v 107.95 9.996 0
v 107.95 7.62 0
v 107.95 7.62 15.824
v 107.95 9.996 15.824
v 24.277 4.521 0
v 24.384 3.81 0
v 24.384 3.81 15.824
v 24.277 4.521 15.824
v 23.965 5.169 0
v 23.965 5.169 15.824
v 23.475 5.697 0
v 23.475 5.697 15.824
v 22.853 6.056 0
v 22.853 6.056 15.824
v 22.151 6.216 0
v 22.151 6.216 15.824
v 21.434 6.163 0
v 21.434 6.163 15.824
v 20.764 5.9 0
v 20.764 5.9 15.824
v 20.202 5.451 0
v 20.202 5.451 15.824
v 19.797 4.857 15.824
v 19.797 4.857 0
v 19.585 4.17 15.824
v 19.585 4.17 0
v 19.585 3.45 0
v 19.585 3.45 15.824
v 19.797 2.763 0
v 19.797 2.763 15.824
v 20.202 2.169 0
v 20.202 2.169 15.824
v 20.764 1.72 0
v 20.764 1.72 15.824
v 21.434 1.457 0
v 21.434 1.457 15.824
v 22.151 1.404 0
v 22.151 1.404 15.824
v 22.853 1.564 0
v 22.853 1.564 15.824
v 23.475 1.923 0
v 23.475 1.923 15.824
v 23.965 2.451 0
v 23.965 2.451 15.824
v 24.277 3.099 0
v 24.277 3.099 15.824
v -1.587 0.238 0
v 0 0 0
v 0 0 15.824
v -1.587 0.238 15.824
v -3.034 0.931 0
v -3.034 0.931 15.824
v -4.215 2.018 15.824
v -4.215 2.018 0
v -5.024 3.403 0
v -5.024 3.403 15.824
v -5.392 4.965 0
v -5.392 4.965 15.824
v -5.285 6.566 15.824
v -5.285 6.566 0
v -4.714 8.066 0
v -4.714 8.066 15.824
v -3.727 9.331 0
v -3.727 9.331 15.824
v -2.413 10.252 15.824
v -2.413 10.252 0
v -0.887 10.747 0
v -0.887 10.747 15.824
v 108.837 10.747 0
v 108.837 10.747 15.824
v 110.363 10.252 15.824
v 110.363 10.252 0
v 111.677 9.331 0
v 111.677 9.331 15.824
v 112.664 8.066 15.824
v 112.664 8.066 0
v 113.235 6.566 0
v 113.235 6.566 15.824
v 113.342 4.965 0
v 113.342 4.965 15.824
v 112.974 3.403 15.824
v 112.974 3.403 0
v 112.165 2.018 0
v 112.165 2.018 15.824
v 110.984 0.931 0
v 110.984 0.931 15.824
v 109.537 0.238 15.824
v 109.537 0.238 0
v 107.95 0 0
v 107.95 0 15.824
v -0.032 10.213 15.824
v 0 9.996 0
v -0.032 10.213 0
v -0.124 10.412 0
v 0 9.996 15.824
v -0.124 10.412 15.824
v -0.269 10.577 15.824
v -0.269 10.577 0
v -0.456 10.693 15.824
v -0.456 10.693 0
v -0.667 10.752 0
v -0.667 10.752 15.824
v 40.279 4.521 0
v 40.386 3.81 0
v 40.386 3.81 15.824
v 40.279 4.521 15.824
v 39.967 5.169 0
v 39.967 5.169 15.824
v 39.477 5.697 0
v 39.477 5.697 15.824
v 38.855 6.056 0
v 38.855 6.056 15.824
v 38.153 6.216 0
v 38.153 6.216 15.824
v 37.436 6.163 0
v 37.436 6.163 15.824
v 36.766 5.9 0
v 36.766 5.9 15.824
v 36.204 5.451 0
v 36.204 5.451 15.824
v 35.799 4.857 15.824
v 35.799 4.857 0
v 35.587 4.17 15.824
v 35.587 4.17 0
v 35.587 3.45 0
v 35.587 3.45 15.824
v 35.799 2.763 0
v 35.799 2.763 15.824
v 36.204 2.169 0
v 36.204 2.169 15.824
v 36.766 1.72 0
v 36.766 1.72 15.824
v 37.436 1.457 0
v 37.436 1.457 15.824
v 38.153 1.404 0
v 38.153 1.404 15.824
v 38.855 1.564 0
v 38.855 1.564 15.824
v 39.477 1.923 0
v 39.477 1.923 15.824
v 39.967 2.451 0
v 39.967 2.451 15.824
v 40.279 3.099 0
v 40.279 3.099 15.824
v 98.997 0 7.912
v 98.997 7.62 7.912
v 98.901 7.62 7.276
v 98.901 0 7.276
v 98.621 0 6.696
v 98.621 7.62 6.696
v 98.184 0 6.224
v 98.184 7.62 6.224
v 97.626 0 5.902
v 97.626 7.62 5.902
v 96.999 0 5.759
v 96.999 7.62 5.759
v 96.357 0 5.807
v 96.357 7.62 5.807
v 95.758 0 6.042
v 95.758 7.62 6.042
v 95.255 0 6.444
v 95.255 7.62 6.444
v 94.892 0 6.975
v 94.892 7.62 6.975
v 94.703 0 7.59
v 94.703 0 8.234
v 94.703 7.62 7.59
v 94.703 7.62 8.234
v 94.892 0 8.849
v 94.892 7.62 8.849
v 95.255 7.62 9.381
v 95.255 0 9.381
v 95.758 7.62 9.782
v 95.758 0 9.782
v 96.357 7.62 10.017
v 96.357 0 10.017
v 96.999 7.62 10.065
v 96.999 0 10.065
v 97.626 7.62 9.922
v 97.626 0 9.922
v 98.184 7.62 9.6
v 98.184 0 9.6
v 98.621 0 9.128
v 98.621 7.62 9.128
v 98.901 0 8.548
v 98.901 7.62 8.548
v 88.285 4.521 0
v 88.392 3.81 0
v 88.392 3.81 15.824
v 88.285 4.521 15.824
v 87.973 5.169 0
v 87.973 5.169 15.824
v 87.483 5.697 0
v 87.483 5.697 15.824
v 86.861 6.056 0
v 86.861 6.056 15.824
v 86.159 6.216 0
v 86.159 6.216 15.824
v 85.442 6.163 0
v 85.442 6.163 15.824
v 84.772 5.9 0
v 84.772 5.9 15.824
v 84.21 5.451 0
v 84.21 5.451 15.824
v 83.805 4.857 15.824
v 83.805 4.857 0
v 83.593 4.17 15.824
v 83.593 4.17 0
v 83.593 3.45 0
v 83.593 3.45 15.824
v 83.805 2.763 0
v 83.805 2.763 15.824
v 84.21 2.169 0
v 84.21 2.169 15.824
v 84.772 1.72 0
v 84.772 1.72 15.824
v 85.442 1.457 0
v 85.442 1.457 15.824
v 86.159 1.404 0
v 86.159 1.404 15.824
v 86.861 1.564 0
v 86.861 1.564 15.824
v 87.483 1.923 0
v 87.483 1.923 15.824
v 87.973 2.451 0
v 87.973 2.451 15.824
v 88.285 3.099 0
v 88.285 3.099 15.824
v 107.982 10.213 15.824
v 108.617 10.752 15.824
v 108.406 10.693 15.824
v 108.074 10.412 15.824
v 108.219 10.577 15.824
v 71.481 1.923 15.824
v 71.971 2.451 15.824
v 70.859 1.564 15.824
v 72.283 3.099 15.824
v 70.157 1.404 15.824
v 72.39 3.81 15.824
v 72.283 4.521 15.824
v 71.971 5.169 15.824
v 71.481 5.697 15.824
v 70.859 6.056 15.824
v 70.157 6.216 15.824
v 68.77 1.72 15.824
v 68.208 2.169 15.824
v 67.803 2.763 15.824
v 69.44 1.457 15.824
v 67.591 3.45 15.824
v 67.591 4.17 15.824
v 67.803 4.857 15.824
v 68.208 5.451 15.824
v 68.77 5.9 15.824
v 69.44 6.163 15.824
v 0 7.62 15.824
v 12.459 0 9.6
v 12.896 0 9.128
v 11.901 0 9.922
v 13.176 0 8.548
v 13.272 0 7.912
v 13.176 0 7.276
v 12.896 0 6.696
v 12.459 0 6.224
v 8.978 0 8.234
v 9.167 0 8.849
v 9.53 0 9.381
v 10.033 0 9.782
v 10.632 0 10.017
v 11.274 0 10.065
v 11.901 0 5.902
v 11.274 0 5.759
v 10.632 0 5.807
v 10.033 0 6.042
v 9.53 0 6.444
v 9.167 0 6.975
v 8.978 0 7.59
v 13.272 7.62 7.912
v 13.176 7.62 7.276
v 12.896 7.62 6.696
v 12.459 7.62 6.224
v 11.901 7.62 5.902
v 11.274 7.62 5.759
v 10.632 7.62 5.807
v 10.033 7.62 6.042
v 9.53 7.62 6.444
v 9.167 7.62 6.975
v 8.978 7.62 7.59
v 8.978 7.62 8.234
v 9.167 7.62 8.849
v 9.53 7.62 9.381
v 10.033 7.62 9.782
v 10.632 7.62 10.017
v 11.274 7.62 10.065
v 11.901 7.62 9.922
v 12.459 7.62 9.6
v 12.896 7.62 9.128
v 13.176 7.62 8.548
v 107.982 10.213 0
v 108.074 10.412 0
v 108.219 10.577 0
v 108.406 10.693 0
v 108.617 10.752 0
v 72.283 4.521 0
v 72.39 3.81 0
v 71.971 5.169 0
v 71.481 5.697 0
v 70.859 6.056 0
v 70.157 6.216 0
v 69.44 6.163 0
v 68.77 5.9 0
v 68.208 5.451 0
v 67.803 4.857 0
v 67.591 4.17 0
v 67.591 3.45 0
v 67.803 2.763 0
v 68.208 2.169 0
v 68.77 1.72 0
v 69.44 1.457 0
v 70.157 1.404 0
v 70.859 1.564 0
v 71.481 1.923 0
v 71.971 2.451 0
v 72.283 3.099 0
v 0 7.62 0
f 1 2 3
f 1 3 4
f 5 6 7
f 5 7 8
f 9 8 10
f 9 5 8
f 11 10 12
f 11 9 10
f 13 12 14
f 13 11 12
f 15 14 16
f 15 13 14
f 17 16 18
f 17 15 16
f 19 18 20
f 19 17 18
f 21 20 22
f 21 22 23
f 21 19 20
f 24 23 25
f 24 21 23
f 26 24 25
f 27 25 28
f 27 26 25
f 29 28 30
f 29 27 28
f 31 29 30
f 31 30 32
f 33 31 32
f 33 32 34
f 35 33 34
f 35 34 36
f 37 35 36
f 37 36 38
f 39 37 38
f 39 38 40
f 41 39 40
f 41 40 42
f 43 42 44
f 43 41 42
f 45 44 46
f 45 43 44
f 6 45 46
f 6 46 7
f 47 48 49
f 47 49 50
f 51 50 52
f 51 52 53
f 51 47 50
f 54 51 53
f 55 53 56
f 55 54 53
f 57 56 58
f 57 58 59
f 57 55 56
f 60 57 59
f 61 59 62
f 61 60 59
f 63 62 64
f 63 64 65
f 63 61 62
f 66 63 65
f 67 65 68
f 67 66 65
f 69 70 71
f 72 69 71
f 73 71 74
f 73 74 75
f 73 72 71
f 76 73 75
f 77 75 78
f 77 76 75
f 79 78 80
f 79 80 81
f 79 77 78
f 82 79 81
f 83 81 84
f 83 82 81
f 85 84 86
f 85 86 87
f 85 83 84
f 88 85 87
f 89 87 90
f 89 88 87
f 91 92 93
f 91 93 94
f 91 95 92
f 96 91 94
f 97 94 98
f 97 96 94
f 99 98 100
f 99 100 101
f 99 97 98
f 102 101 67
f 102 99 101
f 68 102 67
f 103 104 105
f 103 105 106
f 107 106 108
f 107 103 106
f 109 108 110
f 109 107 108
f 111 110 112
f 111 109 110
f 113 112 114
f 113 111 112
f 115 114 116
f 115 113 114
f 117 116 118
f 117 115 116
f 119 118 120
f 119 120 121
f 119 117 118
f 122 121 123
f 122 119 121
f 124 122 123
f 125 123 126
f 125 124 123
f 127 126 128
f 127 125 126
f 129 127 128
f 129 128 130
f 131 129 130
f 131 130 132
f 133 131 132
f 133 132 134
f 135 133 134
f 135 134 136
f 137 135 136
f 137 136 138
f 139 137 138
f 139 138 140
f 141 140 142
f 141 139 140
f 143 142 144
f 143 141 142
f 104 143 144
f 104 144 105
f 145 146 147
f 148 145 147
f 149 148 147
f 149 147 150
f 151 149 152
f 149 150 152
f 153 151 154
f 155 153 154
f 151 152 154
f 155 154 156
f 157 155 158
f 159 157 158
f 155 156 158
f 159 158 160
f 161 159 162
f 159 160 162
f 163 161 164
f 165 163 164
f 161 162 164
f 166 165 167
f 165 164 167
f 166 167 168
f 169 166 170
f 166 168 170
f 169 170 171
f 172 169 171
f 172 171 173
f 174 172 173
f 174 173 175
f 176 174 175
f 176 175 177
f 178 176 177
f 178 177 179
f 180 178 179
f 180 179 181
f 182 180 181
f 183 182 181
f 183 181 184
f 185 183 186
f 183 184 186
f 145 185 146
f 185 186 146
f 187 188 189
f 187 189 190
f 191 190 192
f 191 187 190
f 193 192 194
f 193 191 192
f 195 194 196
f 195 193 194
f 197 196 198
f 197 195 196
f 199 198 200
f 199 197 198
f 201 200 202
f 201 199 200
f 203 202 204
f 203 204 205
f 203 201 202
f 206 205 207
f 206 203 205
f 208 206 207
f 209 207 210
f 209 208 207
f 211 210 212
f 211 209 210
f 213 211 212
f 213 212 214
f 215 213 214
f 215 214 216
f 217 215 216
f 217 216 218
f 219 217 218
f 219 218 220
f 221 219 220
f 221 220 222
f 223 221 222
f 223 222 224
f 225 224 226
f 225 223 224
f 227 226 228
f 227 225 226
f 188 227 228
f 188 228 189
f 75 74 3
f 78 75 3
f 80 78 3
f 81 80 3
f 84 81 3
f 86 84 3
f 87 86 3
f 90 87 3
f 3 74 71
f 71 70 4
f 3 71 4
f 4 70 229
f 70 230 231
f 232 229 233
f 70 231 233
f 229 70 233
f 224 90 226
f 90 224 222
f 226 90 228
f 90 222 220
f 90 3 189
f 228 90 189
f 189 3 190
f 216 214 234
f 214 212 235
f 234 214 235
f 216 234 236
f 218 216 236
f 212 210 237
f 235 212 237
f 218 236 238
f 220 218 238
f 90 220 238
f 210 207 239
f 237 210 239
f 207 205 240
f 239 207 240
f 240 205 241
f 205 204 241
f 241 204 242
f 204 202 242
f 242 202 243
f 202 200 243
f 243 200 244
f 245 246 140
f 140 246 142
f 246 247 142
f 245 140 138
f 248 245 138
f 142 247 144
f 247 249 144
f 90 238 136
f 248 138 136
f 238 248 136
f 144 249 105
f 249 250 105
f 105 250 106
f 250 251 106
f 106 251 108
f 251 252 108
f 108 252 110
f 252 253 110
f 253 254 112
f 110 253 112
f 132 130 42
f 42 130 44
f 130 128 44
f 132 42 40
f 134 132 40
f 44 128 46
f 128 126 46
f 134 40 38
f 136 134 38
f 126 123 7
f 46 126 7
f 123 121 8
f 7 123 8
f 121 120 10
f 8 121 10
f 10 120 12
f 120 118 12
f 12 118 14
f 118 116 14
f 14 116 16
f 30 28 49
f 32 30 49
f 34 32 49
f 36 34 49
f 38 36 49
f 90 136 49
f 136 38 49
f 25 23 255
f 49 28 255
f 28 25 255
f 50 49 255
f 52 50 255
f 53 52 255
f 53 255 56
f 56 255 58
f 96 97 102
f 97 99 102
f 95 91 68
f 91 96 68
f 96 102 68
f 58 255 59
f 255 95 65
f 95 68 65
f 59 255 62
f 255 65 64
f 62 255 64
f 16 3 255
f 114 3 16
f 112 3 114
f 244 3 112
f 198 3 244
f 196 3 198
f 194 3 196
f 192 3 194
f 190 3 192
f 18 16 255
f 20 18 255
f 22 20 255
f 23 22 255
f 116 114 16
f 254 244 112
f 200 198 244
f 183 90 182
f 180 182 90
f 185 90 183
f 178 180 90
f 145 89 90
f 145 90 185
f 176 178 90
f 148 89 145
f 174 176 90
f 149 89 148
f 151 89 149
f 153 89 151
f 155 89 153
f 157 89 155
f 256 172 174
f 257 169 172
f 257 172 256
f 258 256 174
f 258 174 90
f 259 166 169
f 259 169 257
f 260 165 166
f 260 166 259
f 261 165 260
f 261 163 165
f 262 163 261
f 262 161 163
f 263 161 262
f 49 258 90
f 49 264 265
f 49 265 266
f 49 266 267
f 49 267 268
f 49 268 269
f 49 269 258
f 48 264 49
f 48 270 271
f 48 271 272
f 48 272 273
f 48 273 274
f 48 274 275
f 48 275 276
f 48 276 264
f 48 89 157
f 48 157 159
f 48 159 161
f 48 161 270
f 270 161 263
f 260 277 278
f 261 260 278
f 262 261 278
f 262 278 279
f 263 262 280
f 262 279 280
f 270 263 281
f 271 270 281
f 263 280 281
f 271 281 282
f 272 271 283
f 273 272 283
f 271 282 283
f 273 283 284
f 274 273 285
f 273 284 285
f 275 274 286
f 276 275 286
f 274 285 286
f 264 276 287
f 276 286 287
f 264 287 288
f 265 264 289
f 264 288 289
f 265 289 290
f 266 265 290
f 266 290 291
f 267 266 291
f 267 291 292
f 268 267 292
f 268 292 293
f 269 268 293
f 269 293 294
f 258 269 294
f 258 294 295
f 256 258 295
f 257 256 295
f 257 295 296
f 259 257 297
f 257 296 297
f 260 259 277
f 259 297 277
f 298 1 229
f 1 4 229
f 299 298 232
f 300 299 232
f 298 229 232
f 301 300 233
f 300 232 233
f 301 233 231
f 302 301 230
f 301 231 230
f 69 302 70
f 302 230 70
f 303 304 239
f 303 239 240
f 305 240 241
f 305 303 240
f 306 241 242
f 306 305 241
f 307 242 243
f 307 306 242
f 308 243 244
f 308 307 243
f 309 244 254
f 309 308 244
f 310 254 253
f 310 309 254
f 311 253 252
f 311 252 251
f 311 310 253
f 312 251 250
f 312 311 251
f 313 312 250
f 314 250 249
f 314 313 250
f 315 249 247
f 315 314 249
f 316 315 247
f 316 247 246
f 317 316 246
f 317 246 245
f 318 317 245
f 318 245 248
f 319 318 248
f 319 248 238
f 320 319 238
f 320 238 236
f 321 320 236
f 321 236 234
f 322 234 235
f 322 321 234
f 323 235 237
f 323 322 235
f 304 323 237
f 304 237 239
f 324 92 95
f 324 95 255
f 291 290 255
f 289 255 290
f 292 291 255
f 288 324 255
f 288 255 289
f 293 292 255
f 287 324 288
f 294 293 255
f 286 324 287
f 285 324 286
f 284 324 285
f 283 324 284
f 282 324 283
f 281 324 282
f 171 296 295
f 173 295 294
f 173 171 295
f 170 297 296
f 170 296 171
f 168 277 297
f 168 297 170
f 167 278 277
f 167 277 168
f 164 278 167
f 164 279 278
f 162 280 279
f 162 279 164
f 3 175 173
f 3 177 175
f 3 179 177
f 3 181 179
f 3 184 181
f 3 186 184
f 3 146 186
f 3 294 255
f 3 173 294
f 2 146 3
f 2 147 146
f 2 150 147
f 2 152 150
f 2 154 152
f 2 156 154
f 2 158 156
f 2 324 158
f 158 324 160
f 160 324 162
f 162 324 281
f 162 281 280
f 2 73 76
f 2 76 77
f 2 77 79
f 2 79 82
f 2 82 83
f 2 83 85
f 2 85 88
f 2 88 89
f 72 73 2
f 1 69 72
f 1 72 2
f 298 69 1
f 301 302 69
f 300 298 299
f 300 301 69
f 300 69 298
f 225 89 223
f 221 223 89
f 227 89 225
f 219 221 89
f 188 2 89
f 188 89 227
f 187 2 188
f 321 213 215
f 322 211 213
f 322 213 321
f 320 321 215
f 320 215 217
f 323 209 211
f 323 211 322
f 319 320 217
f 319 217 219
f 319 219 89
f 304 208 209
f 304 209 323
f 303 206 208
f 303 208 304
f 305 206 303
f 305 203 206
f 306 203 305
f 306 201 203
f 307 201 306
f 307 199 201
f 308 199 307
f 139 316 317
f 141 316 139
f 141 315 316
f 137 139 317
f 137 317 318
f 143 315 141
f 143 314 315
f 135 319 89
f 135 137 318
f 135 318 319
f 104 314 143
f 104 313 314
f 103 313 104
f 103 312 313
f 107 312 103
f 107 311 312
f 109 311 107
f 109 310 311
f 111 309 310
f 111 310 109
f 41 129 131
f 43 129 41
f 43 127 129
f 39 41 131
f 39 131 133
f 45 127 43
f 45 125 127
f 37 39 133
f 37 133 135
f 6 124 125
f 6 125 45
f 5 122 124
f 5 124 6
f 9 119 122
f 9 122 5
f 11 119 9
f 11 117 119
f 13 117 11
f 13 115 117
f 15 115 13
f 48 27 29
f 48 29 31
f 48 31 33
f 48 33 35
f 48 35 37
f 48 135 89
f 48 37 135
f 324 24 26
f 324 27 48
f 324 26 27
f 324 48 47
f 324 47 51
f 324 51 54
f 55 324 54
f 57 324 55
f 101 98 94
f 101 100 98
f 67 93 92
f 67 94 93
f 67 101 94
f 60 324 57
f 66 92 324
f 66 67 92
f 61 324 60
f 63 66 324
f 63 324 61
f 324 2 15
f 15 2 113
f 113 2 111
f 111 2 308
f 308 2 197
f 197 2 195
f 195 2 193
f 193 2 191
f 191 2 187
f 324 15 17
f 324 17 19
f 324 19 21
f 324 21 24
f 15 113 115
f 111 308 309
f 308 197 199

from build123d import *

# Parameters (mm, degrees)
SKETCH1_R           = 2.413
BOSS_EXTRUDE1_DEPTH = 15.8242
SKETCH3_R           = 2.159
CUT_EXTRUDE1_DEPTH  = 7.62
FILLET1_R           = 0.762


with BuildPart() as part:
    # Sketch1 → Boss-Extrude1 (new body)
    with BuildSketch(Plane.XY):
        with BuildLine():
            Line((0, 7.62), (107.95, 7.62))
            Line((107.95, 7.62), (107.95, 10.8204))
            ThreePointArc((107.95, 10.8204), (113.3602, 5.4102), (107.95, 0))
            Line((107.95, 0), (0, 0))
            ThreePointArc((0, 0), (-5.4102, 5.4102), (0, 10.8204))
            Line((0, 10.8204), (0, 7.62))
        make_face()
        with Locations((21.971, 3.81)):
            Circle(SKETCH1_R, mode=Mode.SUBTRACT)
        with Locations((37.973, 3.81)):
            Circle(SKETCH1_R, mode=Mode.SUBTRACT)
        with Locations((69.977, 3.81)):
            Circle(SKETCH1_R, mode=Mode.SUBTRACT)
        with Locations((85.979, 3.81)):
            Circle(SKETCH1_R, mode=Mode.SUBTRACT)
    extrude(amount=BOSS_EXTRUDE1_DEPTH)

    # Sketch3 → Cut-Extrude1 (cut)
    with BuildSketch(Plane(origin=(0, 7.62, 0), x_dir=(1, 0, 0), z_dir=(0, 1, 0))):
        with Locations((96.8375, -7.9121)):
            Circle(SKETCH3_R)
        with Locations((11.1125, -7.9121)):
            Circle(SKETCH3_R)
    extrude(amount=-CUT_EXTRUDE1_DEPTH, mode=Mode.SUBTRACT)

    # Fillet1
    fillet1_edges = [part.edges().sort_by_distance(p)[0] for p in [
        (0, 10.8204, 7.9121),
        (107.95, 10.8204, 7.9121),
    ]]
    fillet(fillet1_edges, radius=FILLET1_R)


solid = part.part
